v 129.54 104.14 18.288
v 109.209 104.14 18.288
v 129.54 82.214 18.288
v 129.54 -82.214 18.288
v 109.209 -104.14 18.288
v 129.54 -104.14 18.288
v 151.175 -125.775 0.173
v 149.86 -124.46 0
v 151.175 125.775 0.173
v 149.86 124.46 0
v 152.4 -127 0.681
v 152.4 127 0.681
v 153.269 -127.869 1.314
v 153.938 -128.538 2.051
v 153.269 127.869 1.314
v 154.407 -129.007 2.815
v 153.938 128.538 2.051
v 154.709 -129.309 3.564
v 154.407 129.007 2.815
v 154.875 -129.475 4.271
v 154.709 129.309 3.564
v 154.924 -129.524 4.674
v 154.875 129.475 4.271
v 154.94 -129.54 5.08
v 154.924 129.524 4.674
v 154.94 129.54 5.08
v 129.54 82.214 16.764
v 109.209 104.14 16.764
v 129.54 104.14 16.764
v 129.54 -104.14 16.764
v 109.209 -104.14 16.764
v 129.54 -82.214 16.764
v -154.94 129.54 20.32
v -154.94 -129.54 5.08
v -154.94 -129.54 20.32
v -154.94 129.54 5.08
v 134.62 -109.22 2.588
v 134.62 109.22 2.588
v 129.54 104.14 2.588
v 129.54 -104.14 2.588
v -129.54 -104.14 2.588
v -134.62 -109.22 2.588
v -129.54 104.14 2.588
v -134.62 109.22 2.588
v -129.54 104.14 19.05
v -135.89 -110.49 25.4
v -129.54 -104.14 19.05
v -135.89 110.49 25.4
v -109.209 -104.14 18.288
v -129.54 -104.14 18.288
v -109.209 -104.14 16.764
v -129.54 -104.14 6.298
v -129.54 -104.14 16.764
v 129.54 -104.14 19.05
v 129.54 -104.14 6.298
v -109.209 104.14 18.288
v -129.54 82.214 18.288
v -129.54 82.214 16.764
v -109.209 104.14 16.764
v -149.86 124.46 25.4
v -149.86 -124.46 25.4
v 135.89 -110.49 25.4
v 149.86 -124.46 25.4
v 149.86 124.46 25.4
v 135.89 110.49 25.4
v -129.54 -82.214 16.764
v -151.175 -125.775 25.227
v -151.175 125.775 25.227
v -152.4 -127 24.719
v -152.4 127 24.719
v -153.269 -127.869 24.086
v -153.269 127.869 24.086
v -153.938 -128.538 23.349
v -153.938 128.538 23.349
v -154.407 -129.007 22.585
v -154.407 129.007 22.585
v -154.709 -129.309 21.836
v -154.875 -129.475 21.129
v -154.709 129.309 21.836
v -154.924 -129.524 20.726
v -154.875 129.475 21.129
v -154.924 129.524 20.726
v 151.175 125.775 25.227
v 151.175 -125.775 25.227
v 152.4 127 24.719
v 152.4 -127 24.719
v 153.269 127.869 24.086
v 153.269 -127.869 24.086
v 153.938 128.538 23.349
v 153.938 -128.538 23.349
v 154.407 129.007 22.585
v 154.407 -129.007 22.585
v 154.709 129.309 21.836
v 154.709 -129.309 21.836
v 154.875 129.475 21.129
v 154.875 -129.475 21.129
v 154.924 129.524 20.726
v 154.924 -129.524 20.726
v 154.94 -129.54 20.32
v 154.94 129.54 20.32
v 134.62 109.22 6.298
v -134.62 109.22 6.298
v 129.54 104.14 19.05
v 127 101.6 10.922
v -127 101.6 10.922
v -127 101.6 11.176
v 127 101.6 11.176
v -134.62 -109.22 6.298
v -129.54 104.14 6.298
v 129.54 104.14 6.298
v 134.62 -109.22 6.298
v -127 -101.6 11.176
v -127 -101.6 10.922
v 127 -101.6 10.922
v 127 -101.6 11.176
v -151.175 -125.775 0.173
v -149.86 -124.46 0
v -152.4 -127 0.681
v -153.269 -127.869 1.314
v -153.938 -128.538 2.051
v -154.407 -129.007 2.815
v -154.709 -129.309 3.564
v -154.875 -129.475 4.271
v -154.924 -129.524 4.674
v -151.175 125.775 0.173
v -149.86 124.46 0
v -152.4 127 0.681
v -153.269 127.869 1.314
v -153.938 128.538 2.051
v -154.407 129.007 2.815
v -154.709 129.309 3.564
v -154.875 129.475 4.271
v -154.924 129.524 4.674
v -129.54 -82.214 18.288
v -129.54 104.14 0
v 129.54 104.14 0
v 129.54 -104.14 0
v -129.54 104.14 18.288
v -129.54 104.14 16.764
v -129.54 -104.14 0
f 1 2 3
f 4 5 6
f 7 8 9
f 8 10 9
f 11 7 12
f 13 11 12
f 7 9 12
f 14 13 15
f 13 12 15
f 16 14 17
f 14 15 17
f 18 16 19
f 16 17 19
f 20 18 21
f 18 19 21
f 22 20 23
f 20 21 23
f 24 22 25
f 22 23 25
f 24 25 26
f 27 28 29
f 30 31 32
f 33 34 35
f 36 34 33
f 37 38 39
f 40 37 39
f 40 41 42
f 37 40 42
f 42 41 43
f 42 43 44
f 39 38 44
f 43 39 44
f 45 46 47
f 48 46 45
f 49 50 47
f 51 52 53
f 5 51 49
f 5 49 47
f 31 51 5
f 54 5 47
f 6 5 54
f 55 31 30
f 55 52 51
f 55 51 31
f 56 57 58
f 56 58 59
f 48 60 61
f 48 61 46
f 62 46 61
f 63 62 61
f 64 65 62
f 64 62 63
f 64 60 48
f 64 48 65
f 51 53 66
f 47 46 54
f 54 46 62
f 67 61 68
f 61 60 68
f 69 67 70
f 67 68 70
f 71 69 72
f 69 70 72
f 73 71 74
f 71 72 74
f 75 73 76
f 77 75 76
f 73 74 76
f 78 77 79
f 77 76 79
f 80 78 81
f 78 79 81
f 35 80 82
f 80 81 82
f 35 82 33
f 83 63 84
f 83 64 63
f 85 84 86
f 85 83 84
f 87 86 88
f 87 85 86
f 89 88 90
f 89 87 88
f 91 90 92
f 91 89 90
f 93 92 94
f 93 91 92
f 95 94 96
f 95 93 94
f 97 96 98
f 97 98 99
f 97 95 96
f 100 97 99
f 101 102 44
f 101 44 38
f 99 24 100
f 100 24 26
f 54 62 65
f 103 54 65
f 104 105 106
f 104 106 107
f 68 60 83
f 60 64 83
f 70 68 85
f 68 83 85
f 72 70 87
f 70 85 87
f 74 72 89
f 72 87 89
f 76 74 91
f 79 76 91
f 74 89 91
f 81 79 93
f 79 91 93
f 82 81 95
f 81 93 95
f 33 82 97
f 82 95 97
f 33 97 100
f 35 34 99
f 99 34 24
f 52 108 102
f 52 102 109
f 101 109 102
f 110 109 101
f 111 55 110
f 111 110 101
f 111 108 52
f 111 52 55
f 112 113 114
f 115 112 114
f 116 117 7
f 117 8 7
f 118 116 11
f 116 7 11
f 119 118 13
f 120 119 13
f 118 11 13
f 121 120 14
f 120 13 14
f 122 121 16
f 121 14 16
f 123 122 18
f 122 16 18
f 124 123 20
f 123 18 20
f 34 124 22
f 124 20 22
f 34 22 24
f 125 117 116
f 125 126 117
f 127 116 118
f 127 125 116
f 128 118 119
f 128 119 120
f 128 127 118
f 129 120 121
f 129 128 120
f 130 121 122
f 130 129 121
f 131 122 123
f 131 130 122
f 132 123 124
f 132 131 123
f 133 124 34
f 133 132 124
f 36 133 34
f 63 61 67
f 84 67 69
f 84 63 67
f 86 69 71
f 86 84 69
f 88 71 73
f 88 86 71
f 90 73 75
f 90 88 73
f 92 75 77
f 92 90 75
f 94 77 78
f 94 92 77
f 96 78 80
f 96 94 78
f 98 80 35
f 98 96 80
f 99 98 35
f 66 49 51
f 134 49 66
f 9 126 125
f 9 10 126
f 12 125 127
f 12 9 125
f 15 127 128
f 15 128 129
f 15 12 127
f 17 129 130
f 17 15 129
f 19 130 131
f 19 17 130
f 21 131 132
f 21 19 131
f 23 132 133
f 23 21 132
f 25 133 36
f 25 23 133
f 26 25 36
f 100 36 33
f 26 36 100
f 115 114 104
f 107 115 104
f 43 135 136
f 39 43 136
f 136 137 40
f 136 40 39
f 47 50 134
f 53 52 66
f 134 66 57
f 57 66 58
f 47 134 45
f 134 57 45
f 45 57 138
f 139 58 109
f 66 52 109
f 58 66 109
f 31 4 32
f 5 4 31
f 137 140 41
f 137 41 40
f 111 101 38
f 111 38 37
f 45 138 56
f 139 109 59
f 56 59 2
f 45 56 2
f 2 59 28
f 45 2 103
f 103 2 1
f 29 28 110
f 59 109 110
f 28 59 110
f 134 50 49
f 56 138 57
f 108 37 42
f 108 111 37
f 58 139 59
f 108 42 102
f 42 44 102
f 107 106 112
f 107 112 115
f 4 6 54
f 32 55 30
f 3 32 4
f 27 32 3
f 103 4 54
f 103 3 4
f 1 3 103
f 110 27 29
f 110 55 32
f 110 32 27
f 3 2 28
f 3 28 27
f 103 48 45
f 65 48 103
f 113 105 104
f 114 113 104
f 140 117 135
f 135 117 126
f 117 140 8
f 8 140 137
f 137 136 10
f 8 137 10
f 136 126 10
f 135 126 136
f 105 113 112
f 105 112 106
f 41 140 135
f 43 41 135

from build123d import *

# Parameters (mm, degrees)
F0_W      = 254
F0_H      = 203.2
F1_DEPTH  = 0.254
F0_W_2    = 309.88
F0_H_2    = 259.08
F0_W_3    = 259.08
F0_H_3    = 208.28
F2_DEPTH  = 25.4
F3_SIZE   = 6.35
F5_R      = 5.08
F6_W      = 259.08
F6_H      = 3.7094606087
F7_DEPTH  = 5.08
F8_W      = 213.36
F8_H      = 3.7094606087
F9_DEPTH  = 5.08
F10_W     = 264.16
F10_H     = 3.7094606087
F11_DEPTH = 5.08
F12_W     = 218.44
F12_H     = 3.7094606087
F13_DEPTH = 5.08
F16_DEPTH = 1.524


with BuildPart() as f1:
    # F0 (on Top) → F1 (new body)
    with BuildSketch(Plane.XY):
        Rectangle(F0_W, F0_H)
    extrude(amount=F1_DEPTH)


with BuildPart() as f2:
    # F0 (on Top) → F2 (new body)
    with BuildSketch(Plane.XY):
        Rectangle(F0_W_2, F0_H_2)
        Rectangle(F0_W_3, F0_H_3, mode=Mode.SUBTRACT)
    extrude(amount=F2_DEPTH)

    # F3
    f3_edges = [f2.edges().sort_by_distance(p)[0] for p in [
        (0, 104.14, 25.4),
        (-129.54, 0, 25.4),
        (129.54, 0, 25.4),
        (0, -104.14, 25.4),
    ]]
    chamfer(f3_edges, length=F3_SIZE)

    # F5
    f5_edges = [f2.edges().sort_by_distance(p)[0] for p in [
        (-154.94, 0, 25.4),
        (0, -129.54, 25.4),
        (154.94, 0, 25.4),
        (0, 129.54, 25.4),
        (154.94, 0, 0),
        (0, -129.54, 0),
        (-154.94, 0, 0),
        (0, 129.54, 0),
    ]]
    fillet(f5_edges, radius=F5_R)

    # F6 (on face) → F7 (cut)
    with BuildSketch(Plane.XZ.offset(-104.14)):
        with Locations((0, 4.4429339468)):
            Rectangle(F6_W, F6_H)
    extrude(amount=-F7_DEPTH, mode=Mode.SUBTRACT)

    # F8 (on face) → F9 (cut)
    with BuildSketch(Plane.YZ.offset(-129.54)):
        with Locations((2.54, 4.4429339468)):
            Rectangle(F8_W, F8_H)
    extrude(amount=-F9_DEPTH, mode=Mode.SUBTRACT)

    # F10 (on face) → F11 (cut)
    with BuildSketch(Plane(origin=(0, -104.14, 0), x_dir=(-1, 0, 0), z_dir=(0, 1, 0))):
        with Locations((2.54, 4.4429339468)):
            Rectangle(F10_W, F10_H)
    extrude(amount=-F11_DEPTH, mode=Mode.SUBTRACT)

    # F12 (on face) → F13 (cut)
    with BuildSketch(Plane(origin=(129.54, 0, 0), x_dir=(0, -1, 0), z_dir=(-1, 0, 0))):
        with Locations((0, 4.4429339468)):
            Rectangle(F12_W, F12_H)
    extrude(amount=-F13_DEPTH, mode=Mode.SUBTRACT)

    # F15 (on offset) → F16 (join)
    with BuildSketch(Plane.XY.offset(18.288)):
        Polygon((-131.1070173979, 80.5236697197), (-107.8912839293, 105.5615022779), (-132.7292174101, 109.3422397971), align=None)
        Polygon((-132.7292174101, -109.3422397971), (-107.8912839293, -105.5615022779), (-131.1070173979, -80.5236697197), align=None)
        Polygon((132.7292174101, 109.3422397971), (107.8912839293, 105.5615022779), (131.1070173979, 80.5236697197), align=None)
        Polygon((131.1070173979, -80.5236697197), (107.8912839293, -105.5615022779), (132.7292174101, -109.3422397971), align=None)
    extrude(amount=-F16_DEPTH)


with BuildPart() as f1_1:
    # F4: moved
    add(f1.part.moved(Location((0, 0, 10.922))))


solid = Compound([f2.part, f1_1.part])
